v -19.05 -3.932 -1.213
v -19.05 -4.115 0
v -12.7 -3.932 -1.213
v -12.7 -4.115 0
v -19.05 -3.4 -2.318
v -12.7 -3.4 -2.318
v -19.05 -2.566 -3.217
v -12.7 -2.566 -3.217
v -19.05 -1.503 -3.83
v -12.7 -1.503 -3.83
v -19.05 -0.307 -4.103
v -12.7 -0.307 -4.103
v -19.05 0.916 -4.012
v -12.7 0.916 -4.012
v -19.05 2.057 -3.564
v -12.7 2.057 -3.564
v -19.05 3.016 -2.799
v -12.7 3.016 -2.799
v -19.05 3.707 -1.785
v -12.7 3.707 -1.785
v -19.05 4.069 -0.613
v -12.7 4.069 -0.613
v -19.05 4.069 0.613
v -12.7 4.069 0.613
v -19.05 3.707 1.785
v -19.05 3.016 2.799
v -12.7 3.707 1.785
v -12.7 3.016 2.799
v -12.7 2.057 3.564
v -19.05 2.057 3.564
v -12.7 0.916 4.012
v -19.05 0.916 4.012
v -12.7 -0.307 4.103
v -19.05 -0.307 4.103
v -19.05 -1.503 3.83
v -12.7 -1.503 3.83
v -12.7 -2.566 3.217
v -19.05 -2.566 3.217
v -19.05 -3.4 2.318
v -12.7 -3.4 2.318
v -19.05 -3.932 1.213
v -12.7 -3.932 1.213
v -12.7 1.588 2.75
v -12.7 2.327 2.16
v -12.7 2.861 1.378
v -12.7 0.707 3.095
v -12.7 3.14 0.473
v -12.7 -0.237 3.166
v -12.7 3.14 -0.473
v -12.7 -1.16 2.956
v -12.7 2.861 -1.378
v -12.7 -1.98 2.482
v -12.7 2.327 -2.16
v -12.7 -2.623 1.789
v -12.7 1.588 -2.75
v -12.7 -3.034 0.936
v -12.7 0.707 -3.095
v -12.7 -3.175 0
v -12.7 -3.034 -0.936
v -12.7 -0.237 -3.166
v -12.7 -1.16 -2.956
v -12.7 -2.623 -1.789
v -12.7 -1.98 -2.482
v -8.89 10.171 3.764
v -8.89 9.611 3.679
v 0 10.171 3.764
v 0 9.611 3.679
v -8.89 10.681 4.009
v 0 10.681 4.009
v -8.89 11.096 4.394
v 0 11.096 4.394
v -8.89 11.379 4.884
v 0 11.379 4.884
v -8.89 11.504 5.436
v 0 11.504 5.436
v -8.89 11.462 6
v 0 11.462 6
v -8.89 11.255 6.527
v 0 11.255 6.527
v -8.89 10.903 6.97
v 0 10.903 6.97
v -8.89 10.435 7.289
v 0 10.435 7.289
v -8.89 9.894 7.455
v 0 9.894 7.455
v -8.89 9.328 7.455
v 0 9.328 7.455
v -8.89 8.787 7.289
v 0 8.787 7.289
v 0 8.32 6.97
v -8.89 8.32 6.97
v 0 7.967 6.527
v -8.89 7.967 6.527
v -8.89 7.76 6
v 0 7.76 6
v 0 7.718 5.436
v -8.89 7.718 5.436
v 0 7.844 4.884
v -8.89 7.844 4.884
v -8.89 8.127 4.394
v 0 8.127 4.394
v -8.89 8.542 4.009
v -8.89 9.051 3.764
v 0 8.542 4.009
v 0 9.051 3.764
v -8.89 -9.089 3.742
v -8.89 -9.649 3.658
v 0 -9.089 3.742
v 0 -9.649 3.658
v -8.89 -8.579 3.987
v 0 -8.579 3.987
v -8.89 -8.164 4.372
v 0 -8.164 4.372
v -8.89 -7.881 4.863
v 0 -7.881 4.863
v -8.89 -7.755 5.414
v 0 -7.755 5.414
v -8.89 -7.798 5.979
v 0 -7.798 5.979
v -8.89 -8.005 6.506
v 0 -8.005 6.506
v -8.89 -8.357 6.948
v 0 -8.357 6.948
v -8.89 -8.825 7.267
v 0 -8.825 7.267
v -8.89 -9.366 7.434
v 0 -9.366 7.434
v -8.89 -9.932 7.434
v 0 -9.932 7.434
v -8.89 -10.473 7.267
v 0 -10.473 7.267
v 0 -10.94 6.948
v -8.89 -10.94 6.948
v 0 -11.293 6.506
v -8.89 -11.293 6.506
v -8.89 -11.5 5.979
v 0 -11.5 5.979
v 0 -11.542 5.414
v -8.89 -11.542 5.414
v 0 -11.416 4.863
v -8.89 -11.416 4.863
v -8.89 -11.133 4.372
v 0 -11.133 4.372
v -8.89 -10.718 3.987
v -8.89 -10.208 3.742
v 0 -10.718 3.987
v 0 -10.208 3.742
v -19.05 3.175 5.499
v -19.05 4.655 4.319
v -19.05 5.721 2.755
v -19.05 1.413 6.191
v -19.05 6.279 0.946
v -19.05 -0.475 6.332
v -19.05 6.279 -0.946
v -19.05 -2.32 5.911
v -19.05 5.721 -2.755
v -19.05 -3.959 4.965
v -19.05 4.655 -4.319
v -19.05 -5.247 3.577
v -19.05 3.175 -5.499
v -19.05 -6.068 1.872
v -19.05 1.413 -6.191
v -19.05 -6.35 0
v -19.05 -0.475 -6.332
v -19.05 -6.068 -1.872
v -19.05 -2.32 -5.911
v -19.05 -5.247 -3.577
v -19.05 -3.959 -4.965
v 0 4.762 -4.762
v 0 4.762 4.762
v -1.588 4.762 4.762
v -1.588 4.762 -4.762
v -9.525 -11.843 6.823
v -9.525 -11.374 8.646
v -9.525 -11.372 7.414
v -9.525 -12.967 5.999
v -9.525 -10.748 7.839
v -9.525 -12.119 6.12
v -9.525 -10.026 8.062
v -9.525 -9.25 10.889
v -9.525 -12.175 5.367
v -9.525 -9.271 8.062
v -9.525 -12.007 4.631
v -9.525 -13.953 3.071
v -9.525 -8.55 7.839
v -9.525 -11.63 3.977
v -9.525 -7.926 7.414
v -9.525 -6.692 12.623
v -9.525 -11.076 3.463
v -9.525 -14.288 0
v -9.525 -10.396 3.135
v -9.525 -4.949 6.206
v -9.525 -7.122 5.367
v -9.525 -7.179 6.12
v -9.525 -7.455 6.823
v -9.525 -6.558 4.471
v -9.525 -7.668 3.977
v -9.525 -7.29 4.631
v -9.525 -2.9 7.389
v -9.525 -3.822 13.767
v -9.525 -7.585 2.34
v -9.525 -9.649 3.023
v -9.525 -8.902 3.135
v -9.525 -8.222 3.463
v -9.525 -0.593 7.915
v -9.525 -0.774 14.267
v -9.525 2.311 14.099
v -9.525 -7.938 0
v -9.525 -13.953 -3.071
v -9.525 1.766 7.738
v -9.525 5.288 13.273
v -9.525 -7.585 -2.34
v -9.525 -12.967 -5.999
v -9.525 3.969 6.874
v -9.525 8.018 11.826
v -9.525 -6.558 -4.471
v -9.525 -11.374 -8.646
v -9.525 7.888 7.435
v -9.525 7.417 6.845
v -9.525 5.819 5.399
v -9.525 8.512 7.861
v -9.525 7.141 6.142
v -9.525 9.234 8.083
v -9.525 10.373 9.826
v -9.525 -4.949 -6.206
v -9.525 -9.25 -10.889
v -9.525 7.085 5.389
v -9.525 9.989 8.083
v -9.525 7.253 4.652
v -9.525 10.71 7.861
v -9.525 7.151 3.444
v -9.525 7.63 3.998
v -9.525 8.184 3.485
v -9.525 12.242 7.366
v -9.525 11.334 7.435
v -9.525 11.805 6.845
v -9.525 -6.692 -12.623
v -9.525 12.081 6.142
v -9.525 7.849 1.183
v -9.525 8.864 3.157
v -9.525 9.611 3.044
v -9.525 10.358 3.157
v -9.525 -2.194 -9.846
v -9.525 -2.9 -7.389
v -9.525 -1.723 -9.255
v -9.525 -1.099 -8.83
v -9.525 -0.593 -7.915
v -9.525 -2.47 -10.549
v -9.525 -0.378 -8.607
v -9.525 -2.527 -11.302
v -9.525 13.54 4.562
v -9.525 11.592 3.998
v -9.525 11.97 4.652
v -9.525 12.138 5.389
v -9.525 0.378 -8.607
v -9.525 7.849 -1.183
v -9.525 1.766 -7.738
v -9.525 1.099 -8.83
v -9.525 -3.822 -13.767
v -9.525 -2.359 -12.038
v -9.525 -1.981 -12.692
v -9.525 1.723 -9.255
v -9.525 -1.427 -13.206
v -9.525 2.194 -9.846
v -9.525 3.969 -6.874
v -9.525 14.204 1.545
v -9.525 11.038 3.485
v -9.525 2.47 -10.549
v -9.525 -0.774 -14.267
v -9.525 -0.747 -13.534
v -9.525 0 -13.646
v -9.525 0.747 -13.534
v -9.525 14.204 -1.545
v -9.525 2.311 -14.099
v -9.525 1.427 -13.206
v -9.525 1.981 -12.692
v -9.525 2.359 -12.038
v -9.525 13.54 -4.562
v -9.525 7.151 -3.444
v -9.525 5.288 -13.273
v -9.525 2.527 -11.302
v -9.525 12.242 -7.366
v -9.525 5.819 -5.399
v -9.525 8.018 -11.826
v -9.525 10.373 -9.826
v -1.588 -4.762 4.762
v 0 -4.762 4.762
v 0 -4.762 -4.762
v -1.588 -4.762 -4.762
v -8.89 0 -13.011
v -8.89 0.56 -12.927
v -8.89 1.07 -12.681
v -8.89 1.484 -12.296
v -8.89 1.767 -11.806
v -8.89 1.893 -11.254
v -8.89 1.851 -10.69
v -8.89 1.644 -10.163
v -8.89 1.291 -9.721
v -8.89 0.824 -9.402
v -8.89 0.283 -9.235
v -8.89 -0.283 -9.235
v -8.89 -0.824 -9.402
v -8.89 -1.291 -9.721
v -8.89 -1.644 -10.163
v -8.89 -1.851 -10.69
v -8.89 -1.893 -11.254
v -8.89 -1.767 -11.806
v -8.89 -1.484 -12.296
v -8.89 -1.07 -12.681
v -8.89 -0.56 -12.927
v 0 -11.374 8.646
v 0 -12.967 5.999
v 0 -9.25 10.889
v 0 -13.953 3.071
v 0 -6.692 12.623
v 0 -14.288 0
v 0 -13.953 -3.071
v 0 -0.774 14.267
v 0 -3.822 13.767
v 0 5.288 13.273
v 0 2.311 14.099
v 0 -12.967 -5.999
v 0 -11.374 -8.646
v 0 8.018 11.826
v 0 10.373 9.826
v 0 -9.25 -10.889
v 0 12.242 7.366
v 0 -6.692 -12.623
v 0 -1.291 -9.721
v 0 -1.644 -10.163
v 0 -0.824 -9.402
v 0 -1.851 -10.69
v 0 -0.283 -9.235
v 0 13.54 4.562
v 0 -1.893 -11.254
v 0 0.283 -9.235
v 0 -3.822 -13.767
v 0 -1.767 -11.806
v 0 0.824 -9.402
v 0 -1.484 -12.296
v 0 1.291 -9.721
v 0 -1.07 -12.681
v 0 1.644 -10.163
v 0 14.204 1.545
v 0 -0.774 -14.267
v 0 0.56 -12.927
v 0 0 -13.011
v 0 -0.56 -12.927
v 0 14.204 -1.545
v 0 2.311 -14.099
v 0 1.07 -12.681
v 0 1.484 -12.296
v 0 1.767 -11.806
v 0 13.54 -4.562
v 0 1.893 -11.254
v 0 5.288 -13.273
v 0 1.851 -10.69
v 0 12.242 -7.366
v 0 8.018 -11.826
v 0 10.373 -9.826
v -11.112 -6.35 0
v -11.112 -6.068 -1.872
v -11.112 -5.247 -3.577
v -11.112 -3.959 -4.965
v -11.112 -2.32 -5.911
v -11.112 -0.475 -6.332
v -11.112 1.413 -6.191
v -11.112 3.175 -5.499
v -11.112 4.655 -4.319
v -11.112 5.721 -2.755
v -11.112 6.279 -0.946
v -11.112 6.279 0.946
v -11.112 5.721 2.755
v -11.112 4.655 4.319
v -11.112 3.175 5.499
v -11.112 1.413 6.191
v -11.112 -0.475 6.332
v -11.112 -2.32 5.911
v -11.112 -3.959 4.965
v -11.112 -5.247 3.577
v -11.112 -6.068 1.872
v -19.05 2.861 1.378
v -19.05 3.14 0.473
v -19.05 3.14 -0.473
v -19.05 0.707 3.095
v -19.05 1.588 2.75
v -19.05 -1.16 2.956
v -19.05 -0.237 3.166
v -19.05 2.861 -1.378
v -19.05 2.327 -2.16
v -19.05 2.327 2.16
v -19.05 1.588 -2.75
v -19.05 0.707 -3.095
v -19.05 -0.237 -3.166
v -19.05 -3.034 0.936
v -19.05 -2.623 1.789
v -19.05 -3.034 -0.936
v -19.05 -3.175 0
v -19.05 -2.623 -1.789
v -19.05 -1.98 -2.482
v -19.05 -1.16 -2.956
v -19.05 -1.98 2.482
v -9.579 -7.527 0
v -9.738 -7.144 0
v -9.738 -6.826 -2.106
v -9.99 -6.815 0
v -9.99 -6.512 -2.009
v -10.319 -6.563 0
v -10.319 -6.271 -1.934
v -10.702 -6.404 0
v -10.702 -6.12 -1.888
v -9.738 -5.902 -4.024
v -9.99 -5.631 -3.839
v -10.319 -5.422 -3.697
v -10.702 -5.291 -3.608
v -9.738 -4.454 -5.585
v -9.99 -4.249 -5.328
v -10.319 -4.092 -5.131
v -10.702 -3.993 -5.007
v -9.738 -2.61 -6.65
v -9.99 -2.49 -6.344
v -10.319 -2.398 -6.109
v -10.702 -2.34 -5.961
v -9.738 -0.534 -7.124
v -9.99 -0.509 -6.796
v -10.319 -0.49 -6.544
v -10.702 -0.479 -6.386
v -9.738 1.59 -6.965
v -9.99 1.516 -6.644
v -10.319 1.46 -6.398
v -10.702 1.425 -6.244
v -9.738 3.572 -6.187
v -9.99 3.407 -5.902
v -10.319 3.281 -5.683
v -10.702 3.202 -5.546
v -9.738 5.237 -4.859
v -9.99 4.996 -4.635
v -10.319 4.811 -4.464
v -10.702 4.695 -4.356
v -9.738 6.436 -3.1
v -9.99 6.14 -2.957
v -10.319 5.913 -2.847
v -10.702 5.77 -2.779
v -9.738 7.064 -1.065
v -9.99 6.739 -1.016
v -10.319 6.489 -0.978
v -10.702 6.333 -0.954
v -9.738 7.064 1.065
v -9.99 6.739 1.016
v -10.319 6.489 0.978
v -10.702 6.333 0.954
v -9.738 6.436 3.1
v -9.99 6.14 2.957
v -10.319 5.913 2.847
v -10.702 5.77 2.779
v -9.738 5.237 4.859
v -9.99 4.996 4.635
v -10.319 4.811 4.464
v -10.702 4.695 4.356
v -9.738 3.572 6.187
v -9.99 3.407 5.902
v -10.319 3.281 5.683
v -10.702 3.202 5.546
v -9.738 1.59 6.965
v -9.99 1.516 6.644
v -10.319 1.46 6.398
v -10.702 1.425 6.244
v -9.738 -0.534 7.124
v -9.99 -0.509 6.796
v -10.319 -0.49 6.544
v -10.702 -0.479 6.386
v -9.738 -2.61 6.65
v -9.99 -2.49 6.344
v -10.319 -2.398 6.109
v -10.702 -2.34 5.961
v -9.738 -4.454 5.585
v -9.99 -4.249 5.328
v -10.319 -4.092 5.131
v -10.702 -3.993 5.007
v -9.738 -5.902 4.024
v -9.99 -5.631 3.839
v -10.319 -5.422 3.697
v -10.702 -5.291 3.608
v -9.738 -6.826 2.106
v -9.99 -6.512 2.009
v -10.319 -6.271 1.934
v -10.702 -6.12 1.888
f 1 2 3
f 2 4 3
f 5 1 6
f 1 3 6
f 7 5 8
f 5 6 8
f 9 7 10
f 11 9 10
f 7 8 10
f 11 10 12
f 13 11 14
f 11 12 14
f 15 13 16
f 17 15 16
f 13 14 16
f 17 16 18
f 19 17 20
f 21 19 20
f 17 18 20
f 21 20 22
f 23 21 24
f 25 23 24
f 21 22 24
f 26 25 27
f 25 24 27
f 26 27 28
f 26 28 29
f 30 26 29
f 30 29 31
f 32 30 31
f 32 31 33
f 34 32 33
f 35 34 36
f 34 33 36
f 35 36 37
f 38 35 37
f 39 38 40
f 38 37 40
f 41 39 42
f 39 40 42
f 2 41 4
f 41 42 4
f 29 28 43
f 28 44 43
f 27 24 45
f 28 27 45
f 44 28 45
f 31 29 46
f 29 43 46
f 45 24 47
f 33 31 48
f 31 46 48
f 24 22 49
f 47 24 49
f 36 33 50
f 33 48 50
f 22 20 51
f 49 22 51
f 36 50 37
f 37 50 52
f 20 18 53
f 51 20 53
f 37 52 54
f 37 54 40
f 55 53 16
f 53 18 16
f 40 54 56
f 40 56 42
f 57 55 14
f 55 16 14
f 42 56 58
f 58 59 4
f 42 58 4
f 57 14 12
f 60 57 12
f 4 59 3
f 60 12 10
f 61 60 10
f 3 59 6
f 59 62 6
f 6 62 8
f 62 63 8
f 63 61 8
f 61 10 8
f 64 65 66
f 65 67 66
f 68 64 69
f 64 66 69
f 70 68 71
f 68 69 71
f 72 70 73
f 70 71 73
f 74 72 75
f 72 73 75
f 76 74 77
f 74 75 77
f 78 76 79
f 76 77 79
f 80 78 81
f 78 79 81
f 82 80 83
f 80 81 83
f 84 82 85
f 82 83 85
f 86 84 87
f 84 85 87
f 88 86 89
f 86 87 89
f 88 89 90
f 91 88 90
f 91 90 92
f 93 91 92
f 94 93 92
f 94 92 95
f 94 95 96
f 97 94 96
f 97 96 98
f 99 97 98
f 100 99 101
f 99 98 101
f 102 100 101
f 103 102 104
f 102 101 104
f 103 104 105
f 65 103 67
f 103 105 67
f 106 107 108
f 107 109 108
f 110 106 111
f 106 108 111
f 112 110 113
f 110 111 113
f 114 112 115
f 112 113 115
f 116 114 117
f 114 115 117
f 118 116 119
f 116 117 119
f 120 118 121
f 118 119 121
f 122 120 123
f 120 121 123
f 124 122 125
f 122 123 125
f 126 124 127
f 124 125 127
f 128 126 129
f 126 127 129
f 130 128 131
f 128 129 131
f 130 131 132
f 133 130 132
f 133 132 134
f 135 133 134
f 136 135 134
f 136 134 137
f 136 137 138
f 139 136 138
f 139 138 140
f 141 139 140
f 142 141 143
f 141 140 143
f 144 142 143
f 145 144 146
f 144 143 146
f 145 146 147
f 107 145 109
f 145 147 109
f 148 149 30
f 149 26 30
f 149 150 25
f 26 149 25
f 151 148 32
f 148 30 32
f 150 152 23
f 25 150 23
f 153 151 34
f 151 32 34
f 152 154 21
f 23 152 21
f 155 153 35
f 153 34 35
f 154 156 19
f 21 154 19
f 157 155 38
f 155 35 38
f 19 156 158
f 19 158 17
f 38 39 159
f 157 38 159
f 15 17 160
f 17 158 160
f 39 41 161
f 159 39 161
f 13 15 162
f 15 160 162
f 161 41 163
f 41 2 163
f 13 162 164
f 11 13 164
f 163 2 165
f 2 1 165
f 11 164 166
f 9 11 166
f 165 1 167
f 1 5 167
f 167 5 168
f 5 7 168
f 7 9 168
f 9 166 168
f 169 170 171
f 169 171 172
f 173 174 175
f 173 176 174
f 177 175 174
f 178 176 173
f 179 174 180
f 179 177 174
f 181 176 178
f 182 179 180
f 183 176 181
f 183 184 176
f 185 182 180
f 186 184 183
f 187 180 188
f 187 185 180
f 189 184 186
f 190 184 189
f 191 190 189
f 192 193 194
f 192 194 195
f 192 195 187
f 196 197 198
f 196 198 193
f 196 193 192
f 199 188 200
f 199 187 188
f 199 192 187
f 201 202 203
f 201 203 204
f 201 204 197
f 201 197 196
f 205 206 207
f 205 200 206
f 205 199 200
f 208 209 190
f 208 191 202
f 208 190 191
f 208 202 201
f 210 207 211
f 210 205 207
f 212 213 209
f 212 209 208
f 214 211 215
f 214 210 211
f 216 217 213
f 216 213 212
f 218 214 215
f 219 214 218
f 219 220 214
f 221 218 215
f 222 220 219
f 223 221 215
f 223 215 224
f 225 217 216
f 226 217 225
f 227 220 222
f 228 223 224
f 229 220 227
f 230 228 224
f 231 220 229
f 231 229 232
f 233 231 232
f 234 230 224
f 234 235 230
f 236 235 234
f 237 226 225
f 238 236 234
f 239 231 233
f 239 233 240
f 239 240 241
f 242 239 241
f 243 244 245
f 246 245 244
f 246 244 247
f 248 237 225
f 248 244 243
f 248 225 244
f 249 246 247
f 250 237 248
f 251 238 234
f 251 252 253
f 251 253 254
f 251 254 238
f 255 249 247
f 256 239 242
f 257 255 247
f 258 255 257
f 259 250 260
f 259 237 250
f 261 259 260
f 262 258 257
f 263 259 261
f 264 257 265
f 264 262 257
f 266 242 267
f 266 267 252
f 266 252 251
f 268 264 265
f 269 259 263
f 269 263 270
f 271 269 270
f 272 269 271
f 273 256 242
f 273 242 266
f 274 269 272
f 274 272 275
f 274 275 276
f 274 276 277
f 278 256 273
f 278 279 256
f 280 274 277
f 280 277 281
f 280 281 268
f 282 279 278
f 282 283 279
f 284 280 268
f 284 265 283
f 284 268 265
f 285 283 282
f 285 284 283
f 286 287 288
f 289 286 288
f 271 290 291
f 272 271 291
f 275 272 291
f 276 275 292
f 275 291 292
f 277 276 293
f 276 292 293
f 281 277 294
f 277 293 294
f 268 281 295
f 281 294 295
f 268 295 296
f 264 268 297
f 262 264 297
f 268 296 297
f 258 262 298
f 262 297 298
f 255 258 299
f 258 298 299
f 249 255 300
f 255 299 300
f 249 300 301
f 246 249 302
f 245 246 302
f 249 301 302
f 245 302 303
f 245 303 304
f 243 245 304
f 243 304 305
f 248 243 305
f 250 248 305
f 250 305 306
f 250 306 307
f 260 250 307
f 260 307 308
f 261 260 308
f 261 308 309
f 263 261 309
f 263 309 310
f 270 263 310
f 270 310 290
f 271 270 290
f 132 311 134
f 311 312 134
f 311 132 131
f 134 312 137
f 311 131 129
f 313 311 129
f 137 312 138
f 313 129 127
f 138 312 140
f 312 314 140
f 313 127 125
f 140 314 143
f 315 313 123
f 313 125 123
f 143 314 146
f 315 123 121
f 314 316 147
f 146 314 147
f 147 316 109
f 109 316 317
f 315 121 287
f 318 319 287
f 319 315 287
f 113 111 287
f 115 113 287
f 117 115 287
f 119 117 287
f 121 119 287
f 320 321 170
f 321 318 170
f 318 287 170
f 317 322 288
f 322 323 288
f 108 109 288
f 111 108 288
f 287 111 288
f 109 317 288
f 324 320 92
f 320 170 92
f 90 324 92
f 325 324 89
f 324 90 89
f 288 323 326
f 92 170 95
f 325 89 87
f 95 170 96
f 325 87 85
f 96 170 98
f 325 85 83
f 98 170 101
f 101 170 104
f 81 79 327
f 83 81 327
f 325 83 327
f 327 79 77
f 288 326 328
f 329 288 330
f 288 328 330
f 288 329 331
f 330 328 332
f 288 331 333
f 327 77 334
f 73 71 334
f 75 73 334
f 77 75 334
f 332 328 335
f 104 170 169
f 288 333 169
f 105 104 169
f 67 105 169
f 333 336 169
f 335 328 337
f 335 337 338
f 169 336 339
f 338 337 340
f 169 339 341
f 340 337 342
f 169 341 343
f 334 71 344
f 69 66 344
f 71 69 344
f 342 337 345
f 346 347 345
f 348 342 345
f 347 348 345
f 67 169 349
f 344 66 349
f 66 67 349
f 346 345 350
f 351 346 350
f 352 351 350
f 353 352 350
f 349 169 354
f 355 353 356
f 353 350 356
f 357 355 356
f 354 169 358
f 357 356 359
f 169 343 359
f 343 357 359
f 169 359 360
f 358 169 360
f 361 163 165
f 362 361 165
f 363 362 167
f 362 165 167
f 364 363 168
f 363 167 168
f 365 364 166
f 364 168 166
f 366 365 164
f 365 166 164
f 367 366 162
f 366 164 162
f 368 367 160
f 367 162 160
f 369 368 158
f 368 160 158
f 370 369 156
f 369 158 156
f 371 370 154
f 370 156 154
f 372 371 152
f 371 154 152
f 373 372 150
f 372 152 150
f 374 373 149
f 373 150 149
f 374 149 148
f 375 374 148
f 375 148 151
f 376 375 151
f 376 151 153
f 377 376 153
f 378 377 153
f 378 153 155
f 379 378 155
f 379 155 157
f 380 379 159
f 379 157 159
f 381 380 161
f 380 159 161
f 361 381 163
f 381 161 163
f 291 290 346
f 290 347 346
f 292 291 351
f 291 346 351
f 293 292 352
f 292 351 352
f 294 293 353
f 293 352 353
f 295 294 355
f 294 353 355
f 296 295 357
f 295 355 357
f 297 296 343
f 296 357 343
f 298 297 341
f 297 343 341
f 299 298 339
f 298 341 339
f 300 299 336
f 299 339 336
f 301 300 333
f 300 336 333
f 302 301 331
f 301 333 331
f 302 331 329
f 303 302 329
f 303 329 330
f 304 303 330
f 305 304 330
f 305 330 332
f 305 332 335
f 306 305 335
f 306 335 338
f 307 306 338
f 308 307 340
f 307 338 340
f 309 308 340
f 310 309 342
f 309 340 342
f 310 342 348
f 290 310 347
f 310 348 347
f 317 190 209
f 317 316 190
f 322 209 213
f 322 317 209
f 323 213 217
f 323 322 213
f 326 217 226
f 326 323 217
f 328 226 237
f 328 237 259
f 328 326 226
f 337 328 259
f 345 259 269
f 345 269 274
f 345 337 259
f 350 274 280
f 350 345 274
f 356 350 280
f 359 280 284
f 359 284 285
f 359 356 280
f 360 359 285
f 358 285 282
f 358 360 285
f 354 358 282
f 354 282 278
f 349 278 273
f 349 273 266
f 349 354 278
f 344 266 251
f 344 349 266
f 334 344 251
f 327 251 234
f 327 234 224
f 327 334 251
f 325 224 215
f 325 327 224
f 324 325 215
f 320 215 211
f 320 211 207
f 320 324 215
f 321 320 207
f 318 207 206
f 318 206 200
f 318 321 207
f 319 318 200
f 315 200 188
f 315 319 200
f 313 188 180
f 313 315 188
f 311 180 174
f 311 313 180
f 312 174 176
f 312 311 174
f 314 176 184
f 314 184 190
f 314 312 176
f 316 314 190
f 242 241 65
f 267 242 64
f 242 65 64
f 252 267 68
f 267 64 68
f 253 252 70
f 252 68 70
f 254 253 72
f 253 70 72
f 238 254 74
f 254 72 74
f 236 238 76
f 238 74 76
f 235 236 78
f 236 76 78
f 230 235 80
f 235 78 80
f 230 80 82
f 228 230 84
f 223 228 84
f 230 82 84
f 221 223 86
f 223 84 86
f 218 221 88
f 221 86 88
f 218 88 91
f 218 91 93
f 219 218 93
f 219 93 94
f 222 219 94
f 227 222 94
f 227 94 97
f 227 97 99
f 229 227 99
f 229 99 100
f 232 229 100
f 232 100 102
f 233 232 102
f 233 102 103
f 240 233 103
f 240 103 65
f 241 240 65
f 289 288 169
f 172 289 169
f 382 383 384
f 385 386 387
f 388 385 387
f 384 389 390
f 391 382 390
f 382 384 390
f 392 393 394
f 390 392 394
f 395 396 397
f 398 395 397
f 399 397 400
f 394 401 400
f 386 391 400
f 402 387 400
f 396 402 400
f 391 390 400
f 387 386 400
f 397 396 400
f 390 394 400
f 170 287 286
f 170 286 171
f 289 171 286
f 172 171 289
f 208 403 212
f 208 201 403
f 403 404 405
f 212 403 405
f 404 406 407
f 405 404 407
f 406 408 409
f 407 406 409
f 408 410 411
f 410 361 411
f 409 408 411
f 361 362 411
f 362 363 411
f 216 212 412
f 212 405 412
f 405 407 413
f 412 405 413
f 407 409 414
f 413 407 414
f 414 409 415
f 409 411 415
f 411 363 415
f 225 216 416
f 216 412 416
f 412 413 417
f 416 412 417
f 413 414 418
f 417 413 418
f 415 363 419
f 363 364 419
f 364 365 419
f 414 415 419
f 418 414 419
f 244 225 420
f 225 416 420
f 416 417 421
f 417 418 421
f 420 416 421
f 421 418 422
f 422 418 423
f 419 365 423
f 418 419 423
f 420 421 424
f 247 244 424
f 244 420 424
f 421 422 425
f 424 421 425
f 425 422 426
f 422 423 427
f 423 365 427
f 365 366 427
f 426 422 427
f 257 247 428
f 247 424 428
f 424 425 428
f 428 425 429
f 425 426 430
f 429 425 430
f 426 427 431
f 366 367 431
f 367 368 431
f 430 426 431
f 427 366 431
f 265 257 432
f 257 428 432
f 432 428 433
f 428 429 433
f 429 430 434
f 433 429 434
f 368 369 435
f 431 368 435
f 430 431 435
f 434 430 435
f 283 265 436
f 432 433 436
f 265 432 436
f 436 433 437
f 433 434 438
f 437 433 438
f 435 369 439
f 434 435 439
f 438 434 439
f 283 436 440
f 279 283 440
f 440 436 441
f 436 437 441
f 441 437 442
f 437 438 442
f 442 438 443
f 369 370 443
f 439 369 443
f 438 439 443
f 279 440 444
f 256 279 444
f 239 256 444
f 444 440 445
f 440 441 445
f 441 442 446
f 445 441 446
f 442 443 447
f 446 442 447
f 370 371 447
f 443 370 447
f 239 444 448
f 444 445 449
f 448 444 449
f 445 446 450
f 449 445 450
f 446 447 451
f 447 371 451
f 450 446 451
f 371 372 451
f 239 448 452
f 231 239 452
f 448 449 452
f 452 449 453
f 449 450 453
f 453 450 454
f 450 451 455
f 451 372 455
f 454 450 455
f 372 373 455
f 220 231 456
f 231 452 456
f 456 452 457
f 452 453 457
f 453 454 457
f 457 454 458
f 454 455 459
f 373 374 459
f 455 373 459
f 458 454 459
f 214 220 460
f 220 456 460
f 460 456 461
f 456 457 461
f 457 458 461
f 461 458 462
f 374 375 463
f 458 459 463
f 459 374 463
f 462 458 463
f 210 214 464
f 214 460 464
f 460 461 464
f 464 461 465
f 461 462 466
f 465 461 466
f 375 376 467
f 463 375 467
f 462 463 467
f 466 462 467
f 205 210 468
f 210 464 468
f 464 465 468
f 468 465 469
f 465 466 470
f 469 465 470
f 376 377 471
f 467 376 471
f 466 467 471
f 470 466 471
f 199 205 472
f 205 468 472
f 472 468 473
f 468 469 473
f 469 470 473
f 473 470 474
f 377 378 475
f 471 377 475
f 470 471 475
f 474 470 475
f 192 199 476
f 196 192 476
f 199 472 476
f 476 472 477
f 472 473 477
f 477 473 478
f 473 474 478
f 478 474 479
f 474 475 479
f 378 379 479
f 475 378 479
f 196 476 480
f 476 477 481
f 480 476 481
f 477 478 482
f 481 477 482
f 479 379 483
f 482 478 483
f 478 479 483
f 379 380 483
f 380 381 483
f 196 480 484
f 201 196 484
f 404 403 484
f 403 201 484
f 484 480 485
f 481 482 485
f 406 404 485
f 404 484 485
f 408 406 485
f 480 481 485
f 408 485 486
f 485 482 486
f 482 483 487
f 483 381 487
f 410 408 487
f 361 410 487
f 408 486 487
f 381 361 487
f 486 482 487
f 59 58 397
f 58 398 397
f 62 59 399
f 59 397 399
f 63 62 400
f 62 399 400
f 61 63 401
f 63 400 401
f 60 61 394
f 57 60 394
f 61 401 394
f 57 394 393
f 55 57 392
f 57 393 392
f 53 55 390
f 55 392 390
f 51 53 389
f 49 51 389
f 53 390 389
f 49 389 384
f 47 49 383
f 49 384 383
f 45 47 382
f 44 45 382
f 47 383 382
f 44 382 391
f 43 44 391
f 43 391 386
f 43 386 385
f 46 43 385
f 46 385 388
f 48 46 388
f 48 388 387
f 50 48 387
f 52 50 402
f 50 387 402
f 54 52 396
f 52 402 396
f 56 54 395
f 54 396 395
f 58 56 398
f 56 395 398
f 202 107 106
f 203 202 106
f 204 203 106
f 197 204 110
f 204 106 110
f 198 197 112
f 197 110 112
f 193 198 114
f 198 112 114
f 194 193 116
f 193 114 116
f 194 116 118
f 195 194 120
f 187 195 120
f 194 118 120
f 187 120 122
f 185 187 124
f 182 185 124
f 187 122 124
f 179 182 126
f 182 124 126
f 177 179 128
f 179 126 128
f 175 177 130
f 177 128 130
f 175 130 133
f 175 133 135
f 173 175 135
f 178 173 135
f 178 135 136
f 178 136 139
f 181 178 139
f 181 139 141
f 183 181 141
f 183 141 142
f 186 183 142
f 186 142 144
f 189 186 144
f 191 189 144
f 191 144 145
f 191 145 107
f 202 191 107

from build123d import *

# Parameters (mm, degrees)
SKETCH4_W                       = 9.525
SKETCH4_H                       = 9.525
CUT_EXTRUDE1_DEPTH              = 1.5875
FILLET1_R                       = 1.5875
F_6_CLEARANCE_HOLE1_D           = 3.7973
F_6_CLEARANCE_HOLE1_CSINK_D     = 5.0673
F_6_CLEARANCE_HOLE1_CSINK_ANGLE = 90


with BuildPart() as part:
    # Sketch3 → Revolve1 (revolve)
    with BuildSketch(Plane.XY):
        Polygon((-19.05, 0), (0, 0), (0, 14.2875), (-9.525, 14.2875), (-9.525, 6.35), (-19.05, 6.35), (-19.05, 4.1148), (-12.7, 4.1148), (-12.7, 3.175), (-19.05, 3.175), align=None)
    revolve(axis=Axis((-35.206134047, 0, 0), (1, 0, 0)))

    # Sketch4 → Cut-Extrude1 (cut)
    with BuildSketch(Plane(origin=(0, 0, 0), x_dir=(0, 0, -1), z_dir=(1, 0, 0))):
        Rectangle(SKETCH4_W, SKETCH4_H)
    extrude(amount=-CUT_EXTRUDE1_DEPTH, mode=Mode.SUBTRACT)

    # Fillet1
    fillet1_edges = [part.edges().sort_by_distance(p)[0] for p in [
        (-9.525, -6.35, 0),
    ]]
    fillet(fillet1_edges, radius=FILLET1_R)

    # #6 Clearance Hole1 (through all)
    with Locations(Plane.ZY.offset(9.525)):
        with Locations((-11.1125, 0), (5.577986509, 9.611124947), (5.556221618, -9.648822845)):
            CounterSinkHole(F_6_CLEARANCE_HOLE1_D / 2, F_6_CLEARANCE_HOLE1_CSINK_D / 2, counter_sink_angle=F_6_CLEARANCE_HOLE1_CSINK_ANGLE)


solid = part.part
